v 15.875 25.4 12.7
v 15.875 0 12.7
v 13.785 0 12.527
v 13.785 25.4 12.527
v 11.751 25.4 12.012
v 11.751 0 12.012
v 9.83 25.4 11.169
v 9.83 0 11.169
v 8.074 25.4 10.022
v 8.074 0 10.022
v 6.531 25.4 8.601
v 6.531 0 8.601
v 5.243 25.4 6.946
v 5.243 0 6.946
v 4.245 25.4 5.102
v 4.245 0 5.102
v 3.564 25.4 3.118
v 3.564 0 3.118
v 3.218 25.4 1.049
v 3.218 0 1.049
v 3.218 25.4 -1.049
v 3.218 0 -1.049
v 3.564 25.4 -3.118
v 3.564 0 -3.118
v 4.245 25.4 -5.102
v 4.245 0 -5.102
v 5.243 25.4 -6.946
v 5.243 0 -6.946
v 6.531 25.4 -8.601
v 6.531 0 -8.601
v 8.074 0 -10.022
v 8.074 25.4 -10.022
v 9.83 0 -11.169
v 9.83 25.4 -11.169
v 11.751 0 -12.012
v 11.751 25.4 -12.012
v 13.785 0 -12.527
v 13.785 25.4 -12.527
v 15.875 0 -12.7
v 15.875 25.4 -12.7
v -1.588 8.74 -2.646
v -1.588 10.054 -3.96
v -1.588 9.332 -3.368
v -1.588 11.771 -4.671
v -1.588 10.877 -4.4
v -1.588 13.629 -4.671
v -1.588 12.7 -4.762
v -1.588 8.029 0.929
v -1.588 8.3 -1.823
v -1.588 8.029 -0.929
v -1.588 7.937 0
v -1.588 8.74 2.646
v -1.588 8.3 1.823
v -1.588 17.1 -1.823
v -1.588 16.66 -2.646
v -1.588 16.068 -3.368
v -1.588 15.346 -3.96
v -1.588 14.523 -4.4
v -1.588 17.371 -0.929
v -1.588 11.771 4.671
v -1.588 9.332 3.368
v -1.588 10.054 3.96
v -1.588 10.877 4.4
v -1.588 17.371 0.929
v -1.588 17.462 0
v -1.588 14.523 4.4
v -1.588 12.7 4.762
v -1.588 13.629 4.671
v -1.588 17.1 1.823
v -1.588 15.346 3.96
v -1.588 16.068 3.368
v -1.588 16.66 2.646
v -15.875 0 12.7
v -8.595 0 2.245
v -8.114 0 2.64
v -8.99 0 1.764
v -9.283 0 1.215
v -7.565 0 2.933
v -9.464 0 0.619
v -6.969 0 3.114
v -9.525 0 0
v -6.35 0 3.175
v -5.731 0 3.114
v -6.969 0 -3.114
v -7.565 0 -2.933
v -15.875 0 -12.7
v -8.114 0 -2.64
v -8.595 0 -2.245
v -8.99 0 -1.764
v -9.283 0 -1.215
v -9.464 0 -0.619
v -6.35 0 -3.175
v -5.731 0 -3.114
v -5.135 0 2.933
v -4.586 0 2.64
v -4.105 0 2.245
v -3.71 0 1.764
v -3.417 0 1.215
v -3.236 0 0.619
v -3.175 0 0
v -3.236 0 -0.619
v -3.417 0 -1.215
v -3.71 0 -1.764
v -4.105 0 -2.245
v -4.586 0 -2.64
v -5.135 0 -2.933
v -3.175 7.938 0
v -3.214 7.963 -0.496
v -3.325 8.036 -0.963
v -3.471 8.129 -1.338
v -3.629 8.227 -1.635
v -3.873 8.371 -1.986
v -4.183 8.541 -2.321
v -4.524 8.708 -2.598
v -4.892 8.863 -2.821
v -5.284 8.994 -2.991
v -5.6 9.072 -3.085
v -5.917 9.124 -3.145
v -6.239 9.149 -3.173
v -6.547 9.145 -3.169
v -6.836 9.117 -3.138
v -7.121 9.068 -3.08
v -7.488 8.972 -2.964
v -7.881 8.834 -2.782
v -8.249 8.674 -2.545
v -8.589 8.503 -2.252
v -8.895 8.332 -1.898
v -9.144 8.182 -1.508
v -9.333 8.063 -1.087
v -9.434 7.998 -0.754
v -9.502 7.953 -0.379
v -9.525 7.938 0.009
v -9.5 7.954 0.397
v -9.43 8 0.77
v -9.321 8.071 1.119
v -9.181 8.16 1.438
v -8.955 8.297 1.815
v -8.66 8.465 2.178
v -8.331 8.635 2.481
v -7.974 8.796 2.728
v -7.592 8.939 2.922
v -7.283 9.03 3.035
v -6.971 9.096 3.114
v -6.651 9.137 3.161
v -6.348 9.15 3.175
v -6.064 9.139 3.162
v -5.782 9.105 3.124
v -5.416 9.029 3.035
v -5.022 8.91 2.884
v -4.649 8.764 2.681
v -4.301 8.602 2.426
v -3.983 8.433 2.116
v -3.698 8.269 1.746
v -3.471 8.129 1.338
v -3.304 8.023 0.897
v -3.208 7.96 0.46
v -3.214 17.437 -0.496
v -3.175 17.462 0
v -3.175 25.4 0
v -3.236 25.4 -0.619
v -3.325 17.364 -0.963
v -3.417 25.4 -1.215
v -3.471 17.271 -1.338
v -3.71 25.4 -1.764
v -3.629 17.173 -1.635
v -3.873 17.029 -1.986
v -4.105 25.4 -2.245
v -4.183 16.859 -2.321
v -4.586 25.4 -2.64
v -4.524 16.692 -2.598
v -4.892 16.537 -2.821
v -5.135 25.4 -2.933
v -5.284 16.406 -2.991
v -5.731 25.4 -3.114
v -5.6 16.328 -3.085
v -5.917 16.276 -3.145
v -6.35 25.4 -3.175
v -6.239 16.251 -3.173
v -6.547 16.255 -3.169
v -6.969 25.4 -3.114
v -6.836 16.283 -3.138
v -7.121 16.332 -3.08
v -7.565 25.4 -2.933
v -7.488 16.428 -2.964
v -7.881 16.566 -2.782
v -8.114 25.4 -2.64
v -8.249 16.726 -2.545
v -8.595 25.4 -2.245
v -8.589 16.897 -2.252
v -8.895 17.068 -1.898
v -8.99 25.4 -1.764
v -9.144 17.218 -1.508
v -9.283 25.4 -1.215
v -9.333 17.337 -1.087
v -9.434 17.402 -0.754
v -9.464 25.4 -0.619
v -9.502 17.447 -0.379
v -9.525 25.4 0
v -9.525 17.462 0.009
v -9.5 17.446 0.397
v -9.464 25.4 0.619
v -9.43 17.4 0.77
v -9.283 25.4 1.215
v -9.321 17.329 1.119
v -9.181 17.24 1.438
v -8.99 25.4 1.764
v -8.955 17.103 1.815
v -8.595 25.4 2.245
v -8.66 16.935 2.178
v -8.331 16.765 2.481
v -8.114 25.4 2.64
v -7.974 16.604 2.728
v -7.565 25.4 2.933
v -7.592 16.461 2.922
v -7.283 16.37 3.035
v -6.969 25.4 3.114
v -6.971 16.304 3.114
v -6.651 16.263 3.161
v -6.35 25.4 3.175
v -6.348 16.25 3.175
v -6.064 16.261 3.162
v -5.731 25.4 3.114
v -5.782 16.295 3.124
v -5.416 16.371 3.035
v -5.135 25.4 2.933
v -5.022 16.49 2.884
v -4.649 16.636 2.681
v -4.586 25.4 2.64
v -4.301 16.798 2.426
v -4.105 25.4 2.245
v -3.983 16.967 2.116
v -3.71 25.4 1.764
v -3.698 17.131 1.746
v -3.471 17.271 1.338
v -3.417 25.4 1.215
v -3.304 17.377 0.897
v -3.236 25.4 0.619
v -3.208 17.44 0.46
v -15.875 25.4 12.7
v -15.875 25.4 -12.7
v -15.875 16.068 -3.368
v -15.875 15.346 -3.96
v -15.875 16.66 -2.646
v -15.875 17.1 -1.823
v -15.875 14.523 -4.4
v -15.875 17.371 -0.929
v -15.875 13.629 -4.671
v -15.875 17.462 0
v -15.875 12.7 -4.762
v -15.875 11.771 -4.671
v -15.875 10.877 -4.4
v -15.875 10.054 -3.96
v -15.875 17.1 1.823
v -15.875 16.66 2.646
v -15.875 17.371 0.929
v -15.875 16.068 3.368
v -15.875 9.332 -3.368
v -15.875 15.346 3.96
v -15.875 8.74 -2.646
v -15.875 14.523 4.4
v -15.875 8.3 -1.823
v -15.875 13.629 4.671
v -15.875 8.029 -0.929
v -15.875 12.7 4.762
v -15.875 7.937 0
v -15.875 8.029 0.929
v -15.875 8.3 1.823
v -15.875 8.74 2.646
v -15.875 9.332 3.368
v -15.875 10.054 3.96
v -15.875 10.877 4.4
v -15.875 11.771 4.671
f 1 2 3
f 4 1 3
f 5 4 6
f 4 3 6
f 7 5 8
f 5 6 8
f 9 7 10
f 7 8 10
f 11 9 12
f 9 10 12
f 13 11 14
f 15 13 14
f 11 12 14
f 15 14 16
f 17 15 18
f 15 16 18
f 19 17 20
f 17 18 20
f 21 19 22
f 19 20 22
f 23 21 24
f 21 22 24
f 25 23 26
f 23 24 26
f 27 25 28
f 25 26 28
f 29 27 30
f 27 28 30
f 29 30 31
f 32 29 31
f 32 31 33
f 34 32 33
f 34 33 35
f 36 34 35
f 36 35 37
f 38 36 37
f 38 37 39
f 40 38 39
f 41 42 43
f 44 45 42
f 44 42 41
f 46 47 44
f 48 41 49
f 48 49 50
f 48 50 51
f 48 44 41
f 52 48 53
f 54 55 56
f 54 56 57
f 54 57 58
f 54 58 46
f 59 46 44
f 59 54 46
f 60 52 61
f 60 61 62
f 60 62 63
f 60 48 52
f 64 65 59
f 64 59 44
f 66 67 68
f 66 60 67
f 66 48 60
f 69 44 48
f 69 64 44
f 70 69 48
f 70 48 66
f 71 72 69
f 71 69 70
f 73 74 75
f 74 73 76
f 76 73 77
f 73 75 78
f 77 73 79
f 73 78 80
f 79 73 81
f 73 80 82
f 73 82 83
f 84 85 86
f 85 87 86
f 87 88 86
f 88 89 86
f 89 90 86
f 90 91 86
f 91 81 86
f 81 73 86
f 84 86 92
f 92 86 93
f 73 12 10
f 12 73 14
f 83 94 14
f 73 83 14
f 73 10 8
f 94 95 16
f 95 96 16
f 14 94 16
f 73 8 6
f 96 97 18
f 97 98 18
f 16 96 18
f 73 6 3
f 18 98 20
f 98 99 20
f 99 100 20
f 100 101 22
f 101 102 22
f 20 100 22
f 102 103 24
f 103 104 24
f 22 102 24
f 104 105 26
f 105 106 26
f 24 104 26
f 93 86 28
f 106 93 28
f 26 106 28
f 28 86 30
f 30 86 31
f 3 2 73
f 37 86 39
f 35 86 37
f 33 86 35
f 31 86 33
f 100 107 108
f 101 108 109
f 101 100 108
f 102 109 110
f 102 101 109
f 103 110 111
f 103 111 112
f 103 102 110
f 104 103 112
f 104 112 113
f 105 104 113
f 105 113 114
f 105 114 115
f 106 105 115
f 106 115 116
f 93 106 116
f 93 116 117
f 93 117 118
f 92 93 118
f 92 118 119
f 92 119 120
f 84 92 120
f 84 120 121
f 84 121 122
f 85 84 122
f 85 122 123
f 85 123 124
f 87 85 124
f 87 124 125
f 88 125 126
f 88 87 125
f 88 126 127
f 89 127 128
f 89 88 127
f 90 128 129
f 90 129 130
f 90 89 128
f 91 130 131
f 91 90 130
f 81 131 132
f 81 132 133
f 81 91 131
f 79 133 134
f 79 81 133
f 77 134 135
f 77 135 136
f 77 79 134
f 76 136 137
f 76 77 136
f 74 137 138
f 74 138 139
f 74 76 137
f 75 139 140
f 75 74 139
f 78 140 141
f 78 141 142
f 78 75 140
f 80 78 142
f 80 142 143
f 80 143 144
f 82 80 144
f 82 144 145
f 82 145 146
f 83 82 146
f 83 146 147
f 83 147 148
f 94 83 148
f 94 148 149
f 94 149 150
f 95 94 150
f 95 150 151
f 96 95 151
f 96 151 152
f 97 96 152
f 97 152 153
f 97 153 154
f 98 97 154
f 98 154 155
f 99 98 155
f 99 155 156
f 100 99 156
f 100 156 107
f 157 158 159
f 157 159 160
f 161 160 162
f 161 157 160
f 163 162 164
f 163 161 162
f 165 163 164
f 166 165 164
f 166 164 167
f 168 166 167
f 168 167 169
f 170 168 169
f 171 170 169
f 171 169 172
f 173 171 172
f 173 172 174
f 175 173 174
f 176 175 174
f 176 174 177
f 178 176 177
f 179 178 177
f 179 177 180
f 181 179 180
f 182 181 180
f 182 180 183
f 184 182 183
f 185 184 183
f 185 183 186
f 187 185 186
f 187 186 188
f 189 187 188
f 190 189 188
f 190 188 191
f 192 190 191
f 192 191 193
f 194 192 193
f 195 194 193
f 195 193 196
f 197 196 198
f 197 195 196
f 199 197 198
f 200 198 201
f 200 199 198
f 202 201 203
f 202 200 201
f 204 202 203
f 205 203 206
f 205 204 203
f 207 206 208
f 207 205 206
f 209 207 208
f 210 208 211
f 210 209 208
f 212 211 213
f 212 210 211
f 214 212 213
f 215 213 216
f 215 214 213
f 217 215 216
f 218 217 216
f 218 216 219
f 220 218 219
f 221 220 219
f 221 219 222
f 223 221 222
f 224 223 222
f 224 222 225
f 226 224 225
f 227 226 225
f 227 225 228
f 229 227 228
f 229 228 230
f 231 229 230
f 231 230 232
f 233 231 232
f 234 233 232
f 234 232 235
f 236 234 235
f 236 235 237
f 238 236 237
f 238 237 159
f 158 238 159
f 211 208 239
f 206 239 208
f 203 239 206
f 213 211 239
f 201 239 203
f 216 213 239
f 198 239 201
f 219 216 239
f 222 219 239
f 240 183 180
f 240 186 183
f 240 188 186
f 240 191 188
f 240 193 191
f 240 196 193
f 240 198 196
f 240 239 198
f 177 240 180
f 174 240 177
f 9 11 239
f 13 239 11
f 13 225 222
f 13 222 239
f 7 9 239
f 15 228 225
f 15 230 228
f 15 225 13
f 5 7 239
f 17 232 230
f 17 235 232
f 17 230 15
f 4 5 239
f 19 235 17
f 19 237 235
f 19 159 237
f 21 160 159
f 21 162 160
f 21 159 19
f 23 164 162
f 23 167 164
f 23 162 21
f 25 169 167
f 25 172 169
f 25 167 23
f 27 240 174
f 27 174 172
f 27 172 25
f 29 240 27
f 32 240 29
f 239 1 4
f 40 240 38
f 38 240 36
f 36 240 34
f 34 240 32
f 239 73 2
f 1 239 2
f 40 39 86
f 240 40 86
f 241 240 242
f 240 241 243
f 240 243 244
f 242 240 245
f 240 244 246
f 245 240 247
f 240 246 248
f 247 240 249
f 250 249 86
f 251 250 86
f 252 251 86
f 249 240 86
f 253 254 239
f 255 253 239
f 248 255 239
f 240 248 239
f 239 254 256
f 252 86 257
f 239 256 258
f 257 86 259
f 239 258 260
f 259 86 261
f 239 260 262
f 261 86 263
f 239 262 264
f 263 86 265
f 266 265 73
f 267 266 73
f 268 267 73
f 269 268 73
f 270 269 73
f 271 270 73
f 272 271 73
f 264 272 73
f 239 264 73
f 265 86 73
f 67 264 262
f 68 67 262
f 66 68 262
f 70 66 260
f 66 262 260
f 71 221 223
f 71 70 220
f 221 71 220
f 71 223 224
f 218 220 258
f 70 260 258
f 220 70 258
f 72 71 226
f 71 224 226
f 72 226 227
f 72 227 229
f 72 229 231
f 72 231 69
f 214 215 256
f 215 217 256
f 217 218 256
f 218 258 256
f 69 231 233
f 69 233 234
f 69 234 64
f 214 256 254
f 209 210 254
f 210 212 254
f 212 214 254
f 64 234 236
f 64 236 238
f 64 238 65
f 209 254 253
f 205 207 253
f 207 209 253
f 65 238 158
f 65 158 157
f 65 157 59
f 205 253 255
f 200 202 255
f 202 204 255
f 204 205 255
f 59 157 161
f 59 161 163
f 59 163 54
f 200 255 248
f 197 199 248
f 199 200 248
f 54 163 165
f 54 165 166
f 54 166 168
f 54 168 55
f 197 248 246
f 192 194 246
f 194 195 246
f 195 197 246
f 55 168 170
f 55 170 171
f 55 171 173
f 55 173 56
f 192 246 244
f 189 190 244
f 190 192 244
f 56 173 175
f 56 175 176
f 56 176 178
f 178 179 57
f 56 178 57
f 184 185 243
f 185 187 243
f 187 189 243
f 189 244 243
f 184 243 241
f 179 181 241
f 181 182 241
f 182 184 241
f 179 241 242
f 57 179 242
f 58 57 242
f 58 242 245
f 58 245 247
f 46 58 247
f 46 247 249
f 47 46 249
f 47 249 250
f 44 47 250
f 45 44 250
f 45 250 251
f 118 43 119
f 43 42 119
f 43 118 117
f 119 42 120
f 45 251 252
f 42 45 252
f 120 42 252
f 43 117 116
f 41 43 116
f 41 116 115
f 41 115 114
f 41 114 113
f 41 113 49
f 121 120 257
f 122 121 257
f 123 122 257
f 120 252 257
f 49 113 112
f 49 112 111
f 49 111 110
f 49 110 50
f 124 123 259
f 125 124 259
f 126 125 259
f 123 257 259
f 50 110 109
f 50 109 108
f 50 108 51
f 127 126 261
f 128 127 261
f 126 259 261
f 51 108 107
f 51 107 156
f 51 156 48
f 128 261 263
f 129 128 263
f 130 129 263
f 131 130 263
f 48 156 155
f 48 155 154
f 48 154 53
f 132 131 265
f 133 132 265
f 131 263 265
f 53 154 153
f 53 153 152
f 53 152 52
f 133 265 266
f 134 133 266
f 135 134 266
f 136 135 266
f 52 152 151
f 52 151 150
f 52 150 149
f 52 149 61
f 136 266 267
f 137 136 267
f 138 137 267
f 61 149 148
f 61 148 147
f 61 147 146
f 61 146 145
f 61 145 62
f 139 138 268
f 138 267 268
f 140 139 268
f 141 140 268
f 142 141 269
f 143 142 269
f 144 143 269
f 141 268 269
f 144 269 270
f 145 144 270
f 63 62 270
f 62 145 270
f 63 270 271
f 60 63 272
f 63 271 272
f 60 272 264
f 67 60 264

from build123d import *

# Parameters (mm, degrees)
SKETCH2_R           = 3.175
BOSS_EXTRUDE2_DEPTH = 25.4
SKETCH3_R           = 4.7625
CUT_EXTRUDE1_DEPTH  = 14.2875


with BuildPart() as part:
    # Sketch2 → Boss-Extrude2 (new body)
    with BuildSketch(Plane(origin=(0, 0, 0), x_dir=(1, 0, 0), z_dir=(0, 1, 0))):
        with BuildLine():
            Line((-15.875, 12.7), (-15.875, -12.7))
            Line((-15.875, -12.7), (15.875, -12.7))
            ThreePointArc((15.875, -12.7), (3.175, 0), (15.875, 12.7))
            Line((15.875, 12.7), (-15.875, 12.7))
        make_face()
        with Locations((-6.35, 0)):
            Circle(SKETCH2_R, mode=Mode.SUBTRACT)
    extrude(amount=BOSS_EXTRUDE2_DEPTH)

    # Sketch3 → Cut-Extrude1 (cut)
    with BuildSketch(Plane.ZY.offset(15.875)):
        with Locations((0, 12.7)):
            Circle(SKETCH3_R)
    extrude(amount=-CUT_EXTRUDE1_DEPTH, mode=Mode.SUBTRACT)


solid = part.part
